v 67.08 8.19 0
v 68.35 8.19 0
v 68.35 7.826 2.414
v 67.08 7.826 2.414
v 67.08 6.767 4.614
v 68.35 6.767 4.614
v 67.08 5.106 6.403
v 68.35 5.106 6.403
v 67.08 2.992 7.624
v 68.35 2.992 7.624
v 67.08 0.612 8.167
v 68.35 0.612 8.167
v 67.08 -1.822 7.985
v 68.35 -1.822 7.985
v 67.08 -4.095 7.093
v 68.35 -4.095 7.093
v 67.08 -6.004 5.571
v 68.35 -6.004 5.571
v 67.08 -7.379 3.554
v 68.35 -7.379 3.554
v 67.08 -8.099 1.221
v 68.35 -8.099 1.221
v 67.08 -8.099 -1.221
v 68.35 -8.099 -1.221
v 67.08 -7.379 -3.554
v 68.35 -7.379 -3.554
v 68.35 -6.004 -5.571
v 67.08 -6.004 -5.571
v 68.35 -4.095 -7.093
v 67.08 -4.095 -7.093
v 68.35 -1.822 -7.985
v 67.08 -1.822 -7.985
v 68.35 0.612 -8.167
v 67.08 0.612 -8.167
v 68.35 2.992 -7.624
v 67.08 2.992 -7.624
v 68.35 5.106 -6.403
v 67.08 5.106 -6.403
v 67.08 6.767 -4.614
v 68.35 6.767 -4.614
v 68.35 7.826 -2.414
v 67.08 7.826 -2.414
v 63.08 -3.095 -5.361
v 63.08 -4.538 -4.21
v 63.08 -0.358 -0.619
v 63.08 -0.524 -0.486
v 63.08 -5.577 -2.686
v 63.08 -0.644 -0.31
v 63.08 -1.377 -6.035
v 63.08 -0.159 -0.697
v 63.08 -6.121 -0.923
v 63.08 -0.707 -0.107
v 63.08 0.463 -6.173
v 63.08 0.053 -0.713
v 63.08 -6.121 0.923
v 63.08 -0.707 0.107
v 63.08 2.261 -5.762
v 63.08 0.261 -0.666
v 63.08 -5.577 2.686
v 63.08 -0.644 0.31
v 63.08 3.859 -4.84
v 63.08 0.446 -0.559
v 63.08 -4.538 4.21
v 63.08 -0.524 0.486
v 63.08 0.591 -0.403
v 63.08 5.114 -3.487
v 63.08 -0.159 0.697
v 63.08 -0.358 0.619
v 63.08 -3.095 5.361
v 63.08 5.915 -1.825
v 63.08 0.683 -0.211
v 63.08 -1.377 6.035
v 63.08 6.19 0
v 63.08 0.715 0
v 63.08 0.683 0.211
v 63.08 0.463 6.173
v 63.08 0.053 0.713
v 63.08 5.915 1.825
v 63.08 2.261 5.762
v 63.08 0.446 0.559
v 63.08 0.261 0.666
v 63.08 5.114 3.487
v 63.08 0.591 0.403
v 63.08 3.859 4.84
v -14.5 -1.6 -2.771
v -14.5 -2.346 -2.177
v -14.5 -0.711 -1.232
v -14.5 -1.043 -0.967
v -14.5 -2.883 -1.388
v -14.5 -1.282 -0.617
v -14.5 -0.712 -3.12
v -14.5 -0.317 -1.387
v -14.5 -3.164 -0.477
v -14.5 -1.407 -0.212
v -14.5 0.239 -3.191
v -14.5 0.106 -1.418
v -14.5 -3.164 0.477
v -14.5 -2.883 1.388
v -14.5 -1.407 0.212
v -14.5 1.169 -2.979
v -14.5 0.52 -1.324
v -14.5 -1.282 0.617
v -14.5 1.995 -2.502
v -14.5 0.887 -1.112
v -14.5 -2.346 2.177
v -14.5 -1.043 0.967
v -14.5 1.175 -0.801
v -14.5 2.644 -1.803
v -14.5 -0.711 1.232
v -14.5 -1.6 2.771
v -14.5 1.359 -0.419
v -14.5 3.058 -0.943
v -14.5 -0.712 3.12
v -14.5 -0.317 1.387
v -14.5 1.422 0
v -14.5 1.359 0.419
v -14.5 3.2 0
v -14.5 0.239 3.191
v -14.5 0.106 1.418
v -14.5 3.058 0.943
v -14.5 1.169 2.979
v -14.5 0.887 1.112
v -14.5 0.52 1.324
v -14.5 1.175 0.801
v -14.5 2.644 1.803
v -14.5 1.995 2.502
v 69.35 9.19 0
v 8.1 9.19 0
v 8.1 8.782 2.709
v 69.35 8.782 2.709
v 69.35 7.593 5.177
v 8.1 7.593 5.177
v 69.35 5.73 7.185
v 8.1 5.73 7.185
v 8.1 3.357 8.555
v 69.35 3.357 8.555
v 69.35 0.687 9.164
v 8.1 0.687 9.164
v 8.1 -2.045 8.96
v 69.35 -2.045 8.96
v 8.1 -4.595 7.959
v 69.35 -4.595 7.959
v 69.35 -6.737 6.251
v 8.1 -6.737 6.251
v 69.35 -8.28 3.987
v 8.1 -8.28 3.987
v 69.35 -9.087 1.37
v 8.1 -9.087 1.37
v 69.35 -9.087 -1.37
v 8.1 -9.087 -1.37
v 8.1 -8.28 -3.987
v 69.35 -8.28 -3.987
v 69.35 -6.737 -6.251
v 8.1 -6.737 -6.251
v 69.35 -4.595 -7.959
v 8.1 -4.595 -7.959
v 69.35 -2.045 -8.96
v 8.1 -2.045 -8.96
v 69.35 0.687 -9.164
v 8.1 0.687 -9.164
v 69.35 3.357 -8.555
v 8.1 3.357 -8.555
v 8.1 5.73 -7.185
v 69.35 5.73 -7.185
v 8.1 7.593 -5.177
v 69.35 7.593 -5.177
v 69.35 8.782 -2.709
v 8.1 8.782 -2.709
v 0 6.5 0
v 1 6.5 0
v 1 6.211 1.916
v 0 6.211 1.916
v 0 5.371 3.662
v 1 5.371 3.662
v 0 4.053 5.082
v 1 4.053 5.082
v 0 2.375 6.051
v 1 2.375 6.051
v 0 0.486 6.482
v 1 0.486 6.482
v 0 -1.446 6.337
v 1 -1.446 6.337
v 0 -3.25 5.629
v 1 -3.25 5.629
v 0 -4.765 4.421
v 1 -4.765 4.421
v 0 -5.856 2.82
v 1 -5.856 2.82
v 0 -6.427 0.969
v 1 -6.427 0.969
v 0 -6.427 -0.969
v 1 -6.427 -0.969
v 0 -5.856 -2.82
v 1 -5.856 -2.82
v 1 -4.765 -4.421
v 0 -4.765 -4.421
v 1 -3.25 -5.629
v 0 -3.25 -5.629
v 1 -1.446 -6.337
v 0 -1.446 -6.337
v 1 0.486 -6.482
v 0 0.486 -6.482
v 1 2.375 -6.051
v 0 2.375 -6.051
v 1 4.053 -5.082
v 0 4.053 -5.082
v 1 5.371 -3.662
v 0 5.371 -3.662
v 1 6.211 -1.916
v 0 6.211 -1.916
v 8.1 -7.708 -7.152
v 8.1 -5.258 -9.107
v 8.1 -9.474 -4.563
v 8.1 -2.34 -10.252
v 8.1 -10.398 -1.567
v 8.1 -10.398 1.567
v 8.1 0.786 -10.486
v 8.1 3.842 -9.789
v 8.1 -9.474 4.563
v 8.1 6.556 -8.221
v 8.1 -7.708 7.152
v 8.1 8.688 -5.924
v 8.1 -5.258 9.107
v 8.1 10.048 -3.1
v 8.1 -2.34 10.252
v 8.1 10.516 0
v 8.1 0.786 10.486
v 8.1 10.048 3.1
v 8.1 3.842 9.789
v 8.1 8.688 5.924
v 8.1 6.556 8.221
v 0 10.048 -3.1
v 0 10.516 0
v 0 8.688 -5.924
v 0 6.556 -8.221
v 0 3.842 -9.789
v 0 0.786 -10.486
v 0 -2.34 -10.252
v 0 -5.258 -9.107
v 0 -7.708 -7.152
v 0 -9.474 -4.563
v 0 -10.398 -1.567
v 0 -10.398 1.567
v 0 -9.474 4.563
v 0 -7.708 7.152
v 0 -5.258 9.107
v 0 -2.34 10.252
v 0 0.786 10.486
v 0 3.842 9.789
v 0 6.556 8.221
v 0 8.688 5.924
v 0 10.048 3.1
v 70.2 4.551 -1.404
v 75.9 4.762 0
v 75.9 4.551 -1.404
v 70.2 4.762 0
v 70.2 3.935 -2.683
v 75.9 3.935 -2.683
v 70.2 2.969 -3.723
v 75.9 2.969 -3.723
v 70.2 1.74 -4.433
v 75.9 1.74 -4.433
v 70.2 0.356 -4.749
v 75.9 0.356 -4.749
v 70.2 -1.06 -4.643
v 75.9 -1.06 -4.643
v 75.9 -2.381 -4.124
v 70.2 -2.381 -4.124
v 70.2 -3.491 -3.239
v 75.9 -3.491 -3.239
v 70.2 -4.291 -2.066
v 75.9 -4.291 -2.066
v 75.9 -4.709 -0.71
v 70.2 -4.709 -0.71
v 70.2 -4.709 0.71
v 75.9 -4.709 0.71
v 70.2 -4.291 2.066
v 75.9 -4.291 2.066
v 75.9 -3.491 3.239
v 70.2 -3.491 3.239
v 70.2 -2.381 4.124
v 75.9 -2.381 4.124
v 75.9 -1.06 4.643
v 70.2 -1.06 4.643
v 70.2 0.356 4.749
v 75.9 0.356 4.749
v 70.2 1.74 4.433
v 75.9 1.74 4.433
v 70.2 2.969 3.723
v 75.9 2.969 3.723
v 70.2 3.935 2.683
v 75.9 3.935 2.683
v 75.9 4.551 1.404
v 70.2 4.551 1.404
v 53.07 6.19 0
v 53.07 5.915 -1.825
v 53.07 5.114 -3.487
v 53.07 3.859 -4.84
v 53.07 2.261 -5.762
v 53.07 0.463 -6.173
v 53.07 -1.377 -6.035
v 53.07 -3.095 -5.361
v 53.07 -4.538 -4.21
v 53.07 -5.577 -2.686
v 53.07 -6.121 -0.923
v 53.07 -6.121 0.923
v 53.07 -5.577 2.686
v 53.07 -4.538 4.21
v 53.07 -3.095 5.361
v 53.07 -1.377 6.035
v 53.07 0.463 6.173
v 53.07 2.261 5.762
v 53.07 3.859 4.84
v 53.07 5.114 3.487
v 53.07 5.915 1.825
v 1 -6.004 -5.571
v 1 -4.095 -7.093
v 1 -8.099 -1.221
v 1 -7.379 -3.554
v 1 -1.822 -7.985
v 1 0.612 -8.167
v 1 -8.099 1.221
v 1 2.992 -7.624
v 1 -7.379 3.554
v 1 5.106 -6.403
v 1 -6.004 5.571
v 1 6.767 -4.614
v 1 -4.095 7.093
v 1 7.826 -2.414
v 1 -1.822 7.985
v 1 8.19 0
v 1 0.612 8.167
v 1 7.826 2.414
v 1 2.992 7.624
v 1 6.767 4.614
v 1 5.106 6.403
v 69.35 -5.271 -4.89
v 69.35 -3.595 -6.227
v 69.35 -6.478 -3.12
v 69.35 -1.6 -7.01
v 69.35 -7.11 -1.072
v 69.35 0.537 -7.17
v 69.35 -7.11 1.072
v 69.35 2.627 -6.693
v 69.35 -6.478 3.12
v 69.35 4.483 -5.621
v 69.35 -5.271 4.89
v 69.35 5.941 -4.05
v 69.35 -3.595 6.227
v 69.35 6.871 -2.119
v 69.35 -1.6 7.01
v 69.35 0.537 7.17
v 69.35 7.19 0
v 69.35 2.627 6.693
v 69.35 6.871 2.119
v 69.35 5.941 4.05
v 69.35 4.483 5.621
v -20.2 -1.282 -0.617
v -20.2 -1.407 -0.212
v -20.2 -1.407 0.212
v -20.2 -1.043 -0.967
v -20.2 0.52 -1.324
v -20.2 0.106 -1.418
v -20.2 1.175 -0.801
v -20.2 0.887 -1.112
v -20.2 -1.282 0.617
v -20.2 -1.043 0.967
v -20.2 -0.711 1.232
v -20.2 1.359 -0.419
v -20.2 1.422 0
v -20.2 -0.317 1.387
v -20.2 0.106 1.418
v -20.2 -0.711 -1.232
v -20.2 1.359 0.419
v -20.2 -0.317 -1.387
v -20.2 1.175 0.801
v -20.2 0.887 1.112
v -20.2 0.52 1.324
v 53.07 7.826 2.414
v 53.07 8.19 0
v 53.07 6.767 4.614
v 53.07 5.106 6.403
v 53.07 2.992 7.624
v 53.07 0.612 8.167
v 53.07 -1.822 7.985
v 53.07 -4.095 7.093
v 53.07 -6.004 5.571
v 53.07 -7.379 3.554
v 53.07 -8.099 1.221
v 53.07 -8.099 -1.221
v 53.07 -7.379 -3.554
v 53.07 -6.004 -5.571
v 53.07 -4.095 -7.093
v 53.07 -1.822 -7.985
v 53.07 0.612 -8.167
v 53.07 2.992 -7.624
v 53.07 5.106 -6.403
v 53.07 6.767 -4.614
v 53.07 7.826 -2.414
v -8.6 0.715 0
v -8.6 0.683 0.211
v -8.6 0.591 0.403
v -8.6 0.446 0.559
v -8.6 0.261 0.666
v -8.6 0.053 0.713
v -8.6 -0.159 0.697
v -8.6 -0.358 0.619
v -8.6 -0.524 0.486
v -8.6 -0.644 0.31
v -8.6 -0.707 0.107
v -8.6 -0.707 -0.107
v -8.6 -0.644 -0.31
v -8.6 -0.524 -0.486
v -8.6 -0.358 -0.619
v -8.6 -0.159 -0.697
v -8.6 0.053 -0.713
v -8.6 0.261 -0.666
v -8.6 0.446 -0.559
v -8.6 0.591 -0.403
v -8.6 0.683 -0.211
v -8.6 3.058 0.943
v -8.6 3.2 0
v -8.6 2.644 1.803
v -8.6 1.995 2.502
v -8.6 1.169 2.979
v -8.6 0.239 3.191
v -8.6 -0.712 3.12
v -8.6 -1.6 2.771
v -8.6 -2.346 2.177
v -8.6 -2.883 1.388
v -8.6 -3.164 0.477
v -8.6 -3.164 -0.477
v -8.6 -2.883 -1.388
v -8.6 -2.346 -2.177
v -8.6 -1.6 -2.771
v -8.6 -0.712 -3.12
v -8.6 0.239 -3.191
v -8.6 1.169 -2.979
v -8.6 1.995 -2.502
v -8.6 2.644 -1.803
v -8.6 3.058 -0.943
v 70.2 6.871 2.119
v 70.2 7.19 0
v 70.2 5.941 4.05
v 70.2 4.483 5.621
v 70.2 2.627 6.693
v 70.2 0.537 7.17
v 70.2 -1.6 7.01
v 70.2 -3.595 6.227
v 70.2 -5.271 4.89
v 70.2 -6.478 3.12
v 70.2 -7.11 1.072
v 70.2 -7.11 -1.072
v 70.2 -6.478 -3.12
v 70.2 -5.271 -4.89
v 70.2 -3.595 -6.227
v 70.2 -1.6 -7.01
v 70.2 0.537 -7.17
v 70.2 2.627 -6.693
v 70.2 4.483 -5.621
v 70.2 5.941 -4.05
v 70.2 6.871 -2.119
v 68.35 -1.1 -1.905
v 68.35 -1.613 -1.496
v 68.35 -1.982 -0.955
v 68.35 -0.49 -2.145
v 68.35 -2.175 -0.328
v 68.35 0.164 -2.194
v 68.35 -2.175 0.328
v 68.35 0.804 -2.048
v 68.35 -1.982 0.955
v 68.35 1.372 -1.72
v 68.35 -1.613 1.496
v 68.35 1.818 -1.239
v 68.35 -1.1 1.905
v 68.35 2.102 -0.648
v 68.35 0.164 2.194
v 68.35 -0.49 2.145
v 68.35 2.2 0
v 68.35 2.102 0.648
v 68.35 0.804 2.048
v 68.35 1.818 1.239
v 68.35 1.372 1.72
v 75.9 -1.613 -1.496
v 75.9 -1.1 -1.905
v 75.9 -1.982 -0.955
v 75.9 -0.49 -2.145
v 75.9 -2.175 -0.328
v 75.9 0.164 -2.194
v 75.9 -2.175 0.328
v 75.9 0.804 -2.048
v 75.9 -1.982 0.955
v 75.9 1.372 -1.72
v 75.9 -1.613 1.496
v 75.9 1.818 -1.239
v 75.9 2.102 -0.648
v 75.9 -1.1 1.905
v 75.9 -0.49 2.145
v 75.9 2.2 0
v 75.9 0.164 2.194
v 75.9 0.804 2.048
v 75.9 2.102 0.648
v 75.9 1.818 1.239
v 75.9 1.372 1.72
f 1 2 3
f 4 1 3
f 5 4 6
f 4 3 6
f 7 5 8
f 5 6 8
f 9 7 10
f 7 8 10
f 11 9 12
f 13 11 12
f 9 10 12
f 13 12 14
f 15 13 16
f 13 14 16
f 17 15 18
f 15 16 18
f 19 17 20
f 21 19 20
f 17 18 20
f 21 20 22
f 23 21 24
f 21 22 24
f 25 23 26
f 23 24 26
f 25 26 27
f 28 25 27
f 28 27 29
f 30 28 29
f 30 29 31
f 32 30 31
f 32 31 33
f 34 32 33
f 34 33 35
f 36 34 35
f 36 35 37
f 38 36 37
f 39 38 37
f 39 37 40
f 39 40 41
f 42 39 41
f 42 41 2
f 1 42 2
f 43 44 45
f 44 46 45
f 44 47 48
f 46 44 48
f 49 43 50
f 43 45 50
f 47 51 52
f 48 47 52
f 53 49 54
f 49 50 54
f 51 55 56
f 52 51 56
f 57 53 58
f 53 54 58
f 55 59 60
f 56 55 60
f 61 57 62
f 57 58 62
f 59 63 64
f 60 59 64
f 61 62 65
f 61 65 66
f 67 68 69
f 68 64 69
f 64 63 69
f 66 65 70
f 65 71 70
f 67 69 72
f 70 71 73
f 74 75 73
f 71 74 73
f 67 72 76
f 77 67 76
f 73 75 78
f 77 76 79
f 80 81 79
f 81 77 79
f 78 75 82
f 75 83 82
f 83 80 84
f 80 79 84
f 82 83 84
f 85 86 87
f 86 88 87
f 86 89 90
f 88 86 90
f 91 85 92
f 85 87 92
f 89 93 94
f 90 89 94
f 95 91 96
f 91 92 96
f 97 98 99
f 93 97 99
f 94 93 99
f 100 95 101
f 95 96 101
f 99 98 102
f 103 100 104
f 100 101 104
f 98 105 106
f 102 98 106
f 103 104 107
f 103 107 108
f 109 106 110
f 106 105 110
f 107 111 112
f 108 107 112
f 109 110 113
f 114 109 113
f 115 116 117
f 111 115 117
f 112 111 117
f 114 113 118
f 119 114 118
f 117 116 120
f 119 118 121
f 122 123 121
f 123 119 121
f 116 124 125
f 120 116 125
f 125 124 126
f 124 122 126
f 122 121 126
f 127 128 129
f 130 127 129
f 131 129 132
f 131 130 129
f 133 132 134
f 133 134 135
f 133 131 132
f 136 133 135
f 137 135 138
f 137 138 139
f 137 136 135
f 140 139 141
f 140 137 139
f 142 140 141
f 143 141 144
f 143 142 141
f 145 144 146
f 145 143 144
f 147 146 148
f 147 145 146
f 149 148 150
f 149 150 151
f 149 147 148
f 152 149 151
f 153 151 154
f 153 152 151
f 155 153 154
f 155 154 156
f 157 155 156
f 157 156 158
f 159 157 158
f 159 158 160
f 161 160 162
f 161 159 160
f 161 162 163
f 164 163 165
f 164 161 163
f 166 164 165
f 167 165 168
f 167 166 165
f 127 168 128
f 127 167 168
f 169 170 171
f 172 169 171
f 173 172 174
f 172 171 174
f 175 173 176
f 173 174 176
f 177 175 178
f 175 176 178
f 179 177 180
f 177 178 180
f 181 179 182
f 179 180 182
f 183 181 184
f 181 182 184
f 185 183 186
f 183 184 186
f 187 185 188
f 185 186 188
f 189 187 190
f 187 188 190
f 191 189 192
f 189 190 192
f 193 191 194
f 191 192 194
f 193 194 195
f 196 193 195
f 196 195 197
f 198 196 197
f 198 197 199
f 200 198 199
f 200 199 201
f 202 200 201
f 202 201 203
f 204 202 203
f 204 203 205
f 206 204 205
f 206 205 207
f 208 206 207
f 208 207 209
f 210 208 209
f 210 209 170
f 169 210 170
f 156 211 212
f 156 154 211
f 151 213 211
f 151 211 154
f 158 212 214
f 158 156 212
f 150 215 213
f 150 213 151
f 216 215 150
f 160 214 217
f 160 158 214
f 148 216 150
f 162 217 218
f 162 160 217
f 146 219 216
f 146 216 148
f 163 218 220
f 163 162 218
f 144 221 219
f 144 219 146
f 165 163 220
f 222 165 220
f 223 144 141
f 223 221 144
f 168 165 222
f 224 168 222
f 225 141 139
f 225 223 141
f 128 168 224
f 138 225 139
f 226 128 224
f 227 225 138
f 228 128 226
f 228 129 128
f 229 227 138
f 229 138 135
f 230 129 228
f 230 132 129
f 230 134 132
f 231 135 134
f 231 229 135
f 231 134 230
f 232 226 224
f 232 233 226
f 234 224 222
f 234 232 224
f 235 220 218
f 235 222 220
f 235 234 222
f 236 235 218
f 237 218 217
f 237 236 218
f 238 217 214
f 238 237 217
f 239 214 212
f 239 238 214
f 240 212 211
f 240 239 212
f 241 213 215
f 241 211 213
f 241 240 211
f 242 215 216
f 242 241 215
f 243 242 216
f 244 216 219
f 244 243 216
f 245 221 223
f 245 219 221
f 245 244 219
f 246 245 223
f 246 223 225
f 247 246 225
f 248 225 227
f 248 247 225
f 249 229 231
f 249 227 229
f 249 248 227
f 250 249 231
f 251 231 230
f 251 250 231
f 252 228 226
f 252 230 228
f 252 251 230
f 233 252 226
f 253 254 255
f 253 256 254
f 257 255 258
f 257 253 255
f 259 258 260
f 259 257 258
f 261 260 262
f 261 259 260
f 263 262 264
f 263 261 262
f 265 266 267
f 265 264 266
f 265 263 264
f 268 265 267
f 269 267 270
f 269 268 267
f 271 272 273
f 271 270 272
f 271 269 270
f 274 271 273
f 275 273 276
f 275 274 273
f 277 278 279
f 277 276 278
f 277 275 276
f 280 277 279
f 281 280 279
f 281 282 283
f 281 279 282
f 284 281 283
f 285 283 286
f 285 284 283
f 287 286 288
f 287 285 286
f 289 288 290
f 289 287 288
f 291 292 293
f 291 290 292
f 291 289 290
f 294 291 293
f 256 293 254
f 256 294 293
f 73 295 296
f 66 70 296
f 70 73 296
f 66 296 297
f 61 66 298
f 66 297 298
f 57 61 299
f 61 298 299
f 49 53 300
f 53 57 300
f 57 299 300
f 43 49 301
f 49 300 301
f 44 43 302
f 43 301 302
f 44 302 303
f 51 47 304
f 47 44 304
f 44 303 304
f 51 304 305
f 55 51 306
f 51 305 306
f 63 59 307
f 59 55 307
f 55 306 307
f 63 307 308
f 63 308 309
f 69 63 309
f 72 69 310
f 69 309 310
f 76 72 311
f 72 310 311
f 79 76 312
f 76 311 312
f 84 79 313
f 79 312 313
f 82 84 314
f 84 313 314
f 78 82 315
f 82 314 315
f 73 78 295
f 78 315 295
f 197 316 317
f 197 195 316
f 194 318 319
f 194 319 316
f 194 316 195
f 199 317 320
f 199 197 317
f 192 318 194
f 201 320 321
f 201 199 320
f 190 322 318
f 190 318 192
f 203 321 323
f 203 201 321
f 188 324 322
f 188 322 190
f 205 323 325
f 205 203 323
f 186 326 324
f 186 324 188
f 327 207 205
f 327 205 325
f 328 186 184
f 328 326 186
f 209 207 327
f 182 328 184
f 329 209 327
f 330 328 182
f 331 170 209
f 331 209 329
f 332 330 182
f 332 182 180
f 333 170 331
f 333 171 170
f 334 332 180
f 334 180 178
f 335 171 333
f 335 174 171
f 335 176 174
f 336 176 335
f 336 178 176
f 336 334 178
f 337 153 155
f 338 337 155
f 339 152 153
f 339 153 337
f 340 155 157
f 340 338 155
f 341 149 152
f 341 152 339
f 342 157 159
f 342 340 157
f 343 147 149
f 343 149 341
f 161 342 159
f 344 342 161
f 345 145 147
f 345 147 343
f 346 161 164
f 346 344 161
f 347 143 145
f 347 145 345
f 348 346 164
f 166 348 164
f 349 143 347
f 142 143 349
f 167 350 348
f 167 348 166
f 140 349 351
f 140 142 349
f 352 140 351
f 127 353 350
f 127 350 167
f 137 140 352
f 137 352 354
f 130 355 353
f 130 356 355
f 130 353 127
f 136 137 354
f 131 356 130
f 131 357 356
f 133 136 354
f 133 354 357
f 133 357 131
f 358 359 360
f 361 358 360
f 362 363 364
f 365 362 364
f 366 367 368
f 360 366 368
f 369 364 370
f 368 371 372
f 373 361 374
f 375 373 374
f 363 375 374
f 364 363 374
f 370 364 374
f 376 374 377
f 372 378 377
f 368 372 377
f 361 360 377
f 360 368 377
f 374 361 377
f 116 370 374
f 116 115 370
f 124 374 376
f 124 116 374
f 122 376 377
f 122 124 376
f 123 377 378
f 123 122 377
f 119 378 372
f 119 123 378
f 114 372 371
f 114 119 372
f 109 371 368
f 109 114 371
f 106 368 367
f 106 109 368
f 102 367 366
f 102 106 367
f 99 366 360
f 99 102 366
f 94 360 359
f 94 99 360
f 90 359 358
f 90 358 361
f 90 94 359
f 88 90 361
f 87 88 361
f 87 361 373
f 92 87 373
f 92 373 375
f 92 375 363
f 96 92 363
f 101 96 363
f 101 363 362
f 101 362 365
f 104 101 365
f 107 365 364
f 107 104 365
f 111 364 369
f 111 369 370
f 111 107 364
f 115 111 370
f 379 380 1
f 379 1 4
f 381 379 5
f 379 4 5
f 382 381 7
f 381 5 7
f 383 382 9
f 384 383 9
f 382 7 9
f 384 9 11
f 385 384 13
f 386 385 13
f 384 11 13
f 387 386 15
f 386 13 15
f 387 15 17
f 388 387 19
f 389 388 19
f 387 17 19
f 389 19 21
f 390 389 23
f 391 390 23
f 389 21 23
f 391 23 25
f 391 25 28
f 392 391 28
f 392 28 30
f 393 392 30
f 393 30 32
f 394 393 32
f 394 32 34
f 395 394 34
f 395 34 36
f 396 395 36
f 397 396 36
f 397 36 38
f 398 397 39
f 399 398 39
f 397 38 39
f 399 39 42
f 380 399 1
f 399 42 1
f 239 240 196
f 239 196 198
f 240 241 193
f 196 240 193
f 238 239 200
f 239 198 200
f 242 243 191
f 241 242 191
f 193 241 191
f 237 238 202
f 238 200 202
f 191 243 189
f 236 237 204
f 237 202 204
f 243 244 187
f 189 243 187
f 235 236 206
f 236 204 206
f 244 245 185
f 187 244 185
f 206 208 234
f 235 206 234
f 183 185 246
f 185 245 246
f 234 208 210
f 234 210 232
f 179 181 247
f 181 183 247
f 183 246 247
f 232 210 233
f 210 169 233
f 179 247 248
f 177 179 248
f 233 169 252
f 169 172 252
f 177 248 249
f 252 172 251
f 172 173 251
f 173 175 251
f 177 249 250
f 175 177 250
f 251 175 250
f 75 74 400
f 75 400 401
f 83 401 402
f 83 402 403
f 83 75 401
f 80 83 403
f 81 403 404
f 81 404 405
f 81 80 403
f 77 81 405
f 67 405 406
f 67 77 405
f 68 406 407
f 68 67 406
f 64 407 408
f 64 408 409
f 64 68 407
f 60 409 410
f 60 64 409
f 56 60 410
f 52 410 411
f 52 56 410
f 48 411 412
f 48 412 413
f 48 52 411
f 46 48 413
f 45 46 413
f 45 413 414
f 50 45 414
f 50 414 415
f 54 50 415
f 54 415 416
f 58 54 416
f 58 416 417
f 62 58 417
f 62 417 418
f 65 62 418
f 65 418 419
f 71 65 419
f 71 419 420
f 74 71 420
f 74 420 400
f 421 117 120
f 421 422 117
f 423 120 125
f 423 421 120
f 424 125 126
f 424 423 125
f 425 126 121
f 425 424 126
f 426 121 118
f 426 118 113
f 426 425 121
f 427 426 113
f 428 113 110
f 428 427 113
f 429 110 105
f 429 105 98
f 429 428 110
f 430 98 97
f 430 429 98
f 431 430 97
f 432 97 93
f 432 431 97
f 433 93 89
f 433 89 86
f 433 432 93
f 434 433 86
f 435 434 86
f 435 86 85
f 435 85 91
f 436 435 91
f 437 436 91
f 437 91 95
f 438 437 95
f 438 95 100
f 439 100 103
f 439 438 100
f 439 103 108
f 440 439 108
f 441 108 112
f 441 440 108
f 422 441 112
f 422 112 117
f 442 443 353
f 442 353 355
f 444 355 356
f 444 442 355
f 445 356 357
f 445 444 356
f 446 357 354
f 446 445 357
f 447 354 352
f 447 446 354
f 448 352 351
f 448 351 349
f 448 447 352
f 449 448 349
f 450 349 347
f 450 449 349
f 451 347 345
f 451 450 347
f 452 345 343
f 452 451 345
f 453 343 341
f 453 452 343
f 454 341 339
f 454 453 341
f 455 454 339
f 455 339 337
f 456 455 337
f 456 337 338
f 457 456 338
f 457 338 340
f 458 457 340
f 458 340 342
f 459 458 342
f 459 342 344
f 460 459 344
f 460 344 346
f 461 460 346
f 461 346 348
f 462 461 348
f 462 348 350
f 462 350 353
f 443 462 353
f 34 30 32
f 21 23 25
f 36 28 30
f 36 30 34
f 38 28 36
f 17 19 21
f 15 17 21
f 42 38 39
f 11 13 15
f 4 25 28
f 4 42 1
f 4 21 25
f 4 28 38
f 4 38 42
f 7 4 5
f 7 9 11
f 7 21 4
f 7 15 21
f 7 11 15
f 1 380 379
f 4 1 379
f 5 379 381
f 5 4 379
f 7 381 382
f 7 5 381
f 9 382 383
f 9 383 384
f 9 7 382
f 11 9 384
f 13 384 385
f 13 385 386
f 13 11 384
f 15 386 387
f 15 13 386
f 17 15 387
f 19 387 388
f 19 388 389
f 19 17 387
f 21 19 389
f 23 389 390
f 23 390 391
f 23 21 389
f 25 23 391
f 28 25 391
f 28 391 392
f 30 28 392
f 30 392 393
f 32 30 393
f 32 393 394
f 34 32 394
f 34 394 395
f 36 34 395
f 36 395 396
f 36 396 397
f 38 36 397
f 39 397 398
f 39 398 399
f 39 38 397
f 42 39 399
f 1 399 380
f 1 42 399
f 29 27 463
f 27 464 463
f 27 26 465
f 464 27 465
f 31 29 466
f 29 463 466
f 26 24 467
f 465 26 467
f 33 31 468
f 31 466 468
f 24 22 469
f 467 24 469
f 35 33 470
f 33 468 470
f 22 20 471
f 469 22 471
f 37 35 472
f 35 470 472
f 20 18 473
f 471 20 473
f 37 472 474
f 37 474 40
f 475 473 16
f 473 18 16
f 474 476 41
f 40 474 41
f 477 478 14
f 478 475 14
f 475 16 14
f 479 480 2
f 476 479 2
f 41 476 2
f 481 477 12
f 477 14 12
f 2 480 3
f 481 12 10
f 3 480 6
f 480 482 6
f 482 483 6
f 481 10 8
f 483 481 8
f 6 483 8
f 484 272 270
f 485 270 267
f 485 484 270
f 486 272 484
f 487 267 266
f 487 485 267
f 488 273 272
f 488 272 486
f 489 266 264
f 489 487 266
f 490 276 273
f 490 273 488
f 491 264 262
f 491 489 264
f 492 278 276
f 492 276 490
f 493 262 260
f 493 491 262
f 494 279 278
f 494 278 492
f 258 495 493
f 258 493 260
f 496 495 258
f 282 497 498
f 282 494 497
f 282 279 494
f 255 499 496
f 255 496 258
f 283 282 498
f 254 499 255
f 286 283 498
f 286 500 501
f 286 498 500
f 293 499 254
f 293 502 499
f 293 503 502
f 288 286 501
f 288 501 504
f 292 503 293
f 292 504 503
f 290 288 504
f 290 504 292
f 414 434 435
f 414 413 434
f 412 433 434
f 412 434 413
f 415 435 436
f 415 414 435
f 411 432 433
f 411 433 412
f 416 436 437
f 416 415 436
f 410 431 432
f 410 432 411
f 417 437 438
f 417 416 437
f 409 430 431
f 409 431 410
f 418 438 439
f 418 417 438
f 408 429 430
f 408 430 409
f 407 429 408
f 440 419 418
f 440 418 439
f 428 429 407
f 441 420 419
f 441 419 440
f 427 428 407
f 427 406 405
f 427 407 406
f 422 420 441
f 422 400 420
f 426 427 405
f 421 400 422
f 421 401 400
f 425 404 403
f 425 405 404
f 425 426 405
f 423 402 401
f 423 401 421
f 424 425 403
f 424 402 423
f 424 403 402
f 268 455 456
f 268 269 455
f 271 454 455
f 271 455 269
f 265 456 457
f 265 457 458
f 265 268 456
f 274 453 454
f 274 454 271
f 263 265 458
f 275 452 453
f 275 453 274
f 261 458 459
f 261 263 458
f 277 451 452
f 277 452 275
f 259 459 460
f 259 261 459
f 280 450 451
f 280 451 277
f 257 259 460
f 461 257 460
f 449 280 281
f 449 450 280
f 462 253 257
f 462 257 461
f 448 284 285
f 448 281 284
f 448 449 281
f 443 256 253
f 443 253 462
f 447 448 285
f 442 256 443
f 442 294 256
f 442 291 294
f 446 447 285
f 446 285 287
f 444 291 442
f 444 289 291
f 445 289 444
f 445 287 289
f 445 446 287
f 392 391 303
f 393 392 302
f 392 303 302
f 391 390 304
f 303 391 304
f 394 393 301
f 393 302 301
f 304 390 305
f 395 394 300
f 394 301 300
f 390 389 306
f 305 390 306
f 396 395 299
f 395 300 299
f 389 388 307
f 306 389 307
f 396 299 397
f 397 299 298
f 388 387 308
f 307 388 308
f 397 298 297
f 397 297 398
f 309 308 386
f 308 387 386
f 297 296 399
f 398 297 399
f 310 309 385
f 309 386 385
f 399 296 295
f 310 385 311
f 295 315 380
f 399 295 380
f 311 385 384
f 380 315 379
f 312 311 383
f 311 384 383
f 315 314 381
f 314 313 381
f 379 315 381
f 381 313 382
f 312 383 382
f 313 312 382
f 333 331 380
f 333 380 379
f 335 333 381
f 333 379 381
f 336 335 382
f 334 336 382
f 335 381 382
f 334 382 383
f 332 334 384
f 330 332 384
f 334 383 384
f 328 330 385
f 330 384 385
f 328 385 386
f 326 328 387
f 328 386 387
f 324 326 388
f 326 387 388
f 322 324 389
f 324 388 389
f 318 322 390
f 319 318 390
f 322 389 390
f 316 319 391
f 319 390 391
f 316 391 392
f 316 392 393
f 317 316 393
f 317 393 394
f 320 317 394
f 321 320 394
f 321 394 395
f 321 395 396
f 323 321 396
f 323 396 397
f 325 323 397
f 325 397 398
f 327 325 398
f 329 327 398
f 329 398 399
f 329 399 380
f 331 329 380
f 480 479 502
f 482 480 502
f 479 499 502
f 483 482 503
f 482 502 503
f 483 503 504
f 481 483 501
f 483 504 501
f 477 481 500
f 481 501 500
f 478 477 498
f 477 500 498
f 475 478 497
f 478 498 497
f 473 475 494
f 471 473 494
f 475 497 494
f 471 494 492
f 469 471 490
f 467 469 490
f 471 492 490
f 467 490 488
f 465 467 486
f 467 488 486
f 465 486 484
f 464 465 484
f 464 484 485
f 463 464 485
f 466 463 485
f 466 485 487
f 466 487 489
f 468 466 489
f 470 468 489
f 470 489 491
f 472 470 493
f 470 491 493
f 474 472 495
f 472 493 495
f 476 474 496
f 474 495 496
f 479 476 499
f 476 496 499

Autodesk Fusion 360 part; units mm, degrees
sketch "Sketch1" plane through (0, 0, 0) normal (0, 0, 1) x (1, 0, 0)
  line L0 (8.1, 9.19) -> (69.35, 9.19)
  line L1 (8.1, 9.19) -> (8.1, 10.5156)
  line L2 (8.1, 10.5156) -> (0, 10.5156)
  line L3 (0, 10.5156) -> (0, 6.5)
  line L4 (1, 8.19) -> (68.35, 8.19)
  line L5 (68.35, 8.19) -> (68.35, 2.2)
  line L6 (68.35, 2.2) -> (75.9, 2.2)
  line L7 (75.9, 2.2) -> (75.9, 4.7625)
  line L8 (75.9, 4.7625) -> (70.2, 4.7625)
  line L9 (70.2, 4.7625) -> (70.2, 7.19)
  line L10 (0, 6.5) -> (1, 6.5)
  line L11 (1, 6.5) -> (1, 8.19)
  line L12 (69.35, 9.19) -> (69.35, 7.19)
  line L13 (69.35, 7.19) -> (70.2, 7.19)
  line L14 (0, 0) -> (87.0356, 0) construction
  line L15 (67.08, 0) -> (63.08, 0)
  line L16 (53.07, 6.19) -> (53.07, 8.19)
  line L17 (53.07, 8.19) -> (67.08, 8.19)
  line L18 (67.08, 8.19) -> (67.08, 0)
  line L19 (63.08, 0) -> (63.08, 6.19)
  line L20 (63.08, 6.19) -> (53.07, 6.19)
  line L21 (63.08, 0) -> (-20.2, 0)
  line L22 (-20.2, 0) -> (-20.2, 1.4224)
  line L23 (-20.2, 1.4224) -> (-14.5, 1.4224)
  line L24 (-14.5, 1.4224) -> (-14.5, 3.2)
  line L25 (-14.5, 3.2) -> (-8.6, 3.2)
  line L26 (-8.6, 3.2) -> (-8.6, 0.715)
  line L27 (-8.6, 0.715) -> (63.08, 0.715)
  dimension "d2" = 1
  dimension "d3" = 0.85
  dimension "d5" = 1
  dimension "d6" = 9.19
  dimension "d7" = 10.5156
  dimension "d8" = 8.1
  dimension "d9" = 6.5
  dimension "d10" = 2
  dimension "d11" = 1
  dimension "d12" = 4.7625
  dimension "d13" = 2.2
  dimension "d14" = 5.7
  dimension "d15" = 70.2
  dimension "d16" = 1.27
  dimension "d17" = 52.07
  dimension "d18" = 2
  dimension "d19" = 4
  dimension "d20" = 0.715
  dimension "d21" = 8.6
  dimension "d22" = 1.4224
  dimension "d23" = 5.9
  dimension "d24" = 3.2
  dimension "d25" = 5.7
revolve "Revolve1" add sketch "Sketch1" angle 360 about axis through (0, 0, 0) along (1, 0, 0) contours L0 L1 L2 L3 L4 L5 L6 L7 L8 L9 L10 L11 L12 L13 L17 makes body 1
revolve "Revolve2" add sketch "Sketch1" angle 360 about axis through (0, 0, 0) along (1, 0, 0) separate body contours L4 L15 L16 L17 L18 L19 L20 | L19 L21 L22 L23 L24 L25 L26 L27 makes body 2
copy_body "Body->Comp1" bodies 1 removing the originals makes body 3 in component "DashpotBody"
copy_body "Body->Comp2" bodies 2 removing the originals makes body 4 in component "DashpotPlunger"
component "DashpotBody" placed x (1, 0, 0) y (0, 1, 0) z (0, 0, 1) at (0, 0, 0)
component "DashpotPlunger" placed x (1, 0, 0) y (0, 1, 0) z (0, 0, 1) at (0, 0, 0)
equation "d6 = 18.38 mm / 2"
equation "d7 = 0.828 in / 2"
equation "d9 = ( 13 / 2 ) * 1 mm"
equation "d12 = 3 / 8 / 2 * 1 in"
equation "d13 = 4.4 mm / 2"
equation "d20 = ( 1.43 / 2 ) * 1 mm"
equation "d22 = ( 0.112 / 2 ) * 1 in"
equation "d24 = ( 6.4 / 2 ) * 1 mm"
